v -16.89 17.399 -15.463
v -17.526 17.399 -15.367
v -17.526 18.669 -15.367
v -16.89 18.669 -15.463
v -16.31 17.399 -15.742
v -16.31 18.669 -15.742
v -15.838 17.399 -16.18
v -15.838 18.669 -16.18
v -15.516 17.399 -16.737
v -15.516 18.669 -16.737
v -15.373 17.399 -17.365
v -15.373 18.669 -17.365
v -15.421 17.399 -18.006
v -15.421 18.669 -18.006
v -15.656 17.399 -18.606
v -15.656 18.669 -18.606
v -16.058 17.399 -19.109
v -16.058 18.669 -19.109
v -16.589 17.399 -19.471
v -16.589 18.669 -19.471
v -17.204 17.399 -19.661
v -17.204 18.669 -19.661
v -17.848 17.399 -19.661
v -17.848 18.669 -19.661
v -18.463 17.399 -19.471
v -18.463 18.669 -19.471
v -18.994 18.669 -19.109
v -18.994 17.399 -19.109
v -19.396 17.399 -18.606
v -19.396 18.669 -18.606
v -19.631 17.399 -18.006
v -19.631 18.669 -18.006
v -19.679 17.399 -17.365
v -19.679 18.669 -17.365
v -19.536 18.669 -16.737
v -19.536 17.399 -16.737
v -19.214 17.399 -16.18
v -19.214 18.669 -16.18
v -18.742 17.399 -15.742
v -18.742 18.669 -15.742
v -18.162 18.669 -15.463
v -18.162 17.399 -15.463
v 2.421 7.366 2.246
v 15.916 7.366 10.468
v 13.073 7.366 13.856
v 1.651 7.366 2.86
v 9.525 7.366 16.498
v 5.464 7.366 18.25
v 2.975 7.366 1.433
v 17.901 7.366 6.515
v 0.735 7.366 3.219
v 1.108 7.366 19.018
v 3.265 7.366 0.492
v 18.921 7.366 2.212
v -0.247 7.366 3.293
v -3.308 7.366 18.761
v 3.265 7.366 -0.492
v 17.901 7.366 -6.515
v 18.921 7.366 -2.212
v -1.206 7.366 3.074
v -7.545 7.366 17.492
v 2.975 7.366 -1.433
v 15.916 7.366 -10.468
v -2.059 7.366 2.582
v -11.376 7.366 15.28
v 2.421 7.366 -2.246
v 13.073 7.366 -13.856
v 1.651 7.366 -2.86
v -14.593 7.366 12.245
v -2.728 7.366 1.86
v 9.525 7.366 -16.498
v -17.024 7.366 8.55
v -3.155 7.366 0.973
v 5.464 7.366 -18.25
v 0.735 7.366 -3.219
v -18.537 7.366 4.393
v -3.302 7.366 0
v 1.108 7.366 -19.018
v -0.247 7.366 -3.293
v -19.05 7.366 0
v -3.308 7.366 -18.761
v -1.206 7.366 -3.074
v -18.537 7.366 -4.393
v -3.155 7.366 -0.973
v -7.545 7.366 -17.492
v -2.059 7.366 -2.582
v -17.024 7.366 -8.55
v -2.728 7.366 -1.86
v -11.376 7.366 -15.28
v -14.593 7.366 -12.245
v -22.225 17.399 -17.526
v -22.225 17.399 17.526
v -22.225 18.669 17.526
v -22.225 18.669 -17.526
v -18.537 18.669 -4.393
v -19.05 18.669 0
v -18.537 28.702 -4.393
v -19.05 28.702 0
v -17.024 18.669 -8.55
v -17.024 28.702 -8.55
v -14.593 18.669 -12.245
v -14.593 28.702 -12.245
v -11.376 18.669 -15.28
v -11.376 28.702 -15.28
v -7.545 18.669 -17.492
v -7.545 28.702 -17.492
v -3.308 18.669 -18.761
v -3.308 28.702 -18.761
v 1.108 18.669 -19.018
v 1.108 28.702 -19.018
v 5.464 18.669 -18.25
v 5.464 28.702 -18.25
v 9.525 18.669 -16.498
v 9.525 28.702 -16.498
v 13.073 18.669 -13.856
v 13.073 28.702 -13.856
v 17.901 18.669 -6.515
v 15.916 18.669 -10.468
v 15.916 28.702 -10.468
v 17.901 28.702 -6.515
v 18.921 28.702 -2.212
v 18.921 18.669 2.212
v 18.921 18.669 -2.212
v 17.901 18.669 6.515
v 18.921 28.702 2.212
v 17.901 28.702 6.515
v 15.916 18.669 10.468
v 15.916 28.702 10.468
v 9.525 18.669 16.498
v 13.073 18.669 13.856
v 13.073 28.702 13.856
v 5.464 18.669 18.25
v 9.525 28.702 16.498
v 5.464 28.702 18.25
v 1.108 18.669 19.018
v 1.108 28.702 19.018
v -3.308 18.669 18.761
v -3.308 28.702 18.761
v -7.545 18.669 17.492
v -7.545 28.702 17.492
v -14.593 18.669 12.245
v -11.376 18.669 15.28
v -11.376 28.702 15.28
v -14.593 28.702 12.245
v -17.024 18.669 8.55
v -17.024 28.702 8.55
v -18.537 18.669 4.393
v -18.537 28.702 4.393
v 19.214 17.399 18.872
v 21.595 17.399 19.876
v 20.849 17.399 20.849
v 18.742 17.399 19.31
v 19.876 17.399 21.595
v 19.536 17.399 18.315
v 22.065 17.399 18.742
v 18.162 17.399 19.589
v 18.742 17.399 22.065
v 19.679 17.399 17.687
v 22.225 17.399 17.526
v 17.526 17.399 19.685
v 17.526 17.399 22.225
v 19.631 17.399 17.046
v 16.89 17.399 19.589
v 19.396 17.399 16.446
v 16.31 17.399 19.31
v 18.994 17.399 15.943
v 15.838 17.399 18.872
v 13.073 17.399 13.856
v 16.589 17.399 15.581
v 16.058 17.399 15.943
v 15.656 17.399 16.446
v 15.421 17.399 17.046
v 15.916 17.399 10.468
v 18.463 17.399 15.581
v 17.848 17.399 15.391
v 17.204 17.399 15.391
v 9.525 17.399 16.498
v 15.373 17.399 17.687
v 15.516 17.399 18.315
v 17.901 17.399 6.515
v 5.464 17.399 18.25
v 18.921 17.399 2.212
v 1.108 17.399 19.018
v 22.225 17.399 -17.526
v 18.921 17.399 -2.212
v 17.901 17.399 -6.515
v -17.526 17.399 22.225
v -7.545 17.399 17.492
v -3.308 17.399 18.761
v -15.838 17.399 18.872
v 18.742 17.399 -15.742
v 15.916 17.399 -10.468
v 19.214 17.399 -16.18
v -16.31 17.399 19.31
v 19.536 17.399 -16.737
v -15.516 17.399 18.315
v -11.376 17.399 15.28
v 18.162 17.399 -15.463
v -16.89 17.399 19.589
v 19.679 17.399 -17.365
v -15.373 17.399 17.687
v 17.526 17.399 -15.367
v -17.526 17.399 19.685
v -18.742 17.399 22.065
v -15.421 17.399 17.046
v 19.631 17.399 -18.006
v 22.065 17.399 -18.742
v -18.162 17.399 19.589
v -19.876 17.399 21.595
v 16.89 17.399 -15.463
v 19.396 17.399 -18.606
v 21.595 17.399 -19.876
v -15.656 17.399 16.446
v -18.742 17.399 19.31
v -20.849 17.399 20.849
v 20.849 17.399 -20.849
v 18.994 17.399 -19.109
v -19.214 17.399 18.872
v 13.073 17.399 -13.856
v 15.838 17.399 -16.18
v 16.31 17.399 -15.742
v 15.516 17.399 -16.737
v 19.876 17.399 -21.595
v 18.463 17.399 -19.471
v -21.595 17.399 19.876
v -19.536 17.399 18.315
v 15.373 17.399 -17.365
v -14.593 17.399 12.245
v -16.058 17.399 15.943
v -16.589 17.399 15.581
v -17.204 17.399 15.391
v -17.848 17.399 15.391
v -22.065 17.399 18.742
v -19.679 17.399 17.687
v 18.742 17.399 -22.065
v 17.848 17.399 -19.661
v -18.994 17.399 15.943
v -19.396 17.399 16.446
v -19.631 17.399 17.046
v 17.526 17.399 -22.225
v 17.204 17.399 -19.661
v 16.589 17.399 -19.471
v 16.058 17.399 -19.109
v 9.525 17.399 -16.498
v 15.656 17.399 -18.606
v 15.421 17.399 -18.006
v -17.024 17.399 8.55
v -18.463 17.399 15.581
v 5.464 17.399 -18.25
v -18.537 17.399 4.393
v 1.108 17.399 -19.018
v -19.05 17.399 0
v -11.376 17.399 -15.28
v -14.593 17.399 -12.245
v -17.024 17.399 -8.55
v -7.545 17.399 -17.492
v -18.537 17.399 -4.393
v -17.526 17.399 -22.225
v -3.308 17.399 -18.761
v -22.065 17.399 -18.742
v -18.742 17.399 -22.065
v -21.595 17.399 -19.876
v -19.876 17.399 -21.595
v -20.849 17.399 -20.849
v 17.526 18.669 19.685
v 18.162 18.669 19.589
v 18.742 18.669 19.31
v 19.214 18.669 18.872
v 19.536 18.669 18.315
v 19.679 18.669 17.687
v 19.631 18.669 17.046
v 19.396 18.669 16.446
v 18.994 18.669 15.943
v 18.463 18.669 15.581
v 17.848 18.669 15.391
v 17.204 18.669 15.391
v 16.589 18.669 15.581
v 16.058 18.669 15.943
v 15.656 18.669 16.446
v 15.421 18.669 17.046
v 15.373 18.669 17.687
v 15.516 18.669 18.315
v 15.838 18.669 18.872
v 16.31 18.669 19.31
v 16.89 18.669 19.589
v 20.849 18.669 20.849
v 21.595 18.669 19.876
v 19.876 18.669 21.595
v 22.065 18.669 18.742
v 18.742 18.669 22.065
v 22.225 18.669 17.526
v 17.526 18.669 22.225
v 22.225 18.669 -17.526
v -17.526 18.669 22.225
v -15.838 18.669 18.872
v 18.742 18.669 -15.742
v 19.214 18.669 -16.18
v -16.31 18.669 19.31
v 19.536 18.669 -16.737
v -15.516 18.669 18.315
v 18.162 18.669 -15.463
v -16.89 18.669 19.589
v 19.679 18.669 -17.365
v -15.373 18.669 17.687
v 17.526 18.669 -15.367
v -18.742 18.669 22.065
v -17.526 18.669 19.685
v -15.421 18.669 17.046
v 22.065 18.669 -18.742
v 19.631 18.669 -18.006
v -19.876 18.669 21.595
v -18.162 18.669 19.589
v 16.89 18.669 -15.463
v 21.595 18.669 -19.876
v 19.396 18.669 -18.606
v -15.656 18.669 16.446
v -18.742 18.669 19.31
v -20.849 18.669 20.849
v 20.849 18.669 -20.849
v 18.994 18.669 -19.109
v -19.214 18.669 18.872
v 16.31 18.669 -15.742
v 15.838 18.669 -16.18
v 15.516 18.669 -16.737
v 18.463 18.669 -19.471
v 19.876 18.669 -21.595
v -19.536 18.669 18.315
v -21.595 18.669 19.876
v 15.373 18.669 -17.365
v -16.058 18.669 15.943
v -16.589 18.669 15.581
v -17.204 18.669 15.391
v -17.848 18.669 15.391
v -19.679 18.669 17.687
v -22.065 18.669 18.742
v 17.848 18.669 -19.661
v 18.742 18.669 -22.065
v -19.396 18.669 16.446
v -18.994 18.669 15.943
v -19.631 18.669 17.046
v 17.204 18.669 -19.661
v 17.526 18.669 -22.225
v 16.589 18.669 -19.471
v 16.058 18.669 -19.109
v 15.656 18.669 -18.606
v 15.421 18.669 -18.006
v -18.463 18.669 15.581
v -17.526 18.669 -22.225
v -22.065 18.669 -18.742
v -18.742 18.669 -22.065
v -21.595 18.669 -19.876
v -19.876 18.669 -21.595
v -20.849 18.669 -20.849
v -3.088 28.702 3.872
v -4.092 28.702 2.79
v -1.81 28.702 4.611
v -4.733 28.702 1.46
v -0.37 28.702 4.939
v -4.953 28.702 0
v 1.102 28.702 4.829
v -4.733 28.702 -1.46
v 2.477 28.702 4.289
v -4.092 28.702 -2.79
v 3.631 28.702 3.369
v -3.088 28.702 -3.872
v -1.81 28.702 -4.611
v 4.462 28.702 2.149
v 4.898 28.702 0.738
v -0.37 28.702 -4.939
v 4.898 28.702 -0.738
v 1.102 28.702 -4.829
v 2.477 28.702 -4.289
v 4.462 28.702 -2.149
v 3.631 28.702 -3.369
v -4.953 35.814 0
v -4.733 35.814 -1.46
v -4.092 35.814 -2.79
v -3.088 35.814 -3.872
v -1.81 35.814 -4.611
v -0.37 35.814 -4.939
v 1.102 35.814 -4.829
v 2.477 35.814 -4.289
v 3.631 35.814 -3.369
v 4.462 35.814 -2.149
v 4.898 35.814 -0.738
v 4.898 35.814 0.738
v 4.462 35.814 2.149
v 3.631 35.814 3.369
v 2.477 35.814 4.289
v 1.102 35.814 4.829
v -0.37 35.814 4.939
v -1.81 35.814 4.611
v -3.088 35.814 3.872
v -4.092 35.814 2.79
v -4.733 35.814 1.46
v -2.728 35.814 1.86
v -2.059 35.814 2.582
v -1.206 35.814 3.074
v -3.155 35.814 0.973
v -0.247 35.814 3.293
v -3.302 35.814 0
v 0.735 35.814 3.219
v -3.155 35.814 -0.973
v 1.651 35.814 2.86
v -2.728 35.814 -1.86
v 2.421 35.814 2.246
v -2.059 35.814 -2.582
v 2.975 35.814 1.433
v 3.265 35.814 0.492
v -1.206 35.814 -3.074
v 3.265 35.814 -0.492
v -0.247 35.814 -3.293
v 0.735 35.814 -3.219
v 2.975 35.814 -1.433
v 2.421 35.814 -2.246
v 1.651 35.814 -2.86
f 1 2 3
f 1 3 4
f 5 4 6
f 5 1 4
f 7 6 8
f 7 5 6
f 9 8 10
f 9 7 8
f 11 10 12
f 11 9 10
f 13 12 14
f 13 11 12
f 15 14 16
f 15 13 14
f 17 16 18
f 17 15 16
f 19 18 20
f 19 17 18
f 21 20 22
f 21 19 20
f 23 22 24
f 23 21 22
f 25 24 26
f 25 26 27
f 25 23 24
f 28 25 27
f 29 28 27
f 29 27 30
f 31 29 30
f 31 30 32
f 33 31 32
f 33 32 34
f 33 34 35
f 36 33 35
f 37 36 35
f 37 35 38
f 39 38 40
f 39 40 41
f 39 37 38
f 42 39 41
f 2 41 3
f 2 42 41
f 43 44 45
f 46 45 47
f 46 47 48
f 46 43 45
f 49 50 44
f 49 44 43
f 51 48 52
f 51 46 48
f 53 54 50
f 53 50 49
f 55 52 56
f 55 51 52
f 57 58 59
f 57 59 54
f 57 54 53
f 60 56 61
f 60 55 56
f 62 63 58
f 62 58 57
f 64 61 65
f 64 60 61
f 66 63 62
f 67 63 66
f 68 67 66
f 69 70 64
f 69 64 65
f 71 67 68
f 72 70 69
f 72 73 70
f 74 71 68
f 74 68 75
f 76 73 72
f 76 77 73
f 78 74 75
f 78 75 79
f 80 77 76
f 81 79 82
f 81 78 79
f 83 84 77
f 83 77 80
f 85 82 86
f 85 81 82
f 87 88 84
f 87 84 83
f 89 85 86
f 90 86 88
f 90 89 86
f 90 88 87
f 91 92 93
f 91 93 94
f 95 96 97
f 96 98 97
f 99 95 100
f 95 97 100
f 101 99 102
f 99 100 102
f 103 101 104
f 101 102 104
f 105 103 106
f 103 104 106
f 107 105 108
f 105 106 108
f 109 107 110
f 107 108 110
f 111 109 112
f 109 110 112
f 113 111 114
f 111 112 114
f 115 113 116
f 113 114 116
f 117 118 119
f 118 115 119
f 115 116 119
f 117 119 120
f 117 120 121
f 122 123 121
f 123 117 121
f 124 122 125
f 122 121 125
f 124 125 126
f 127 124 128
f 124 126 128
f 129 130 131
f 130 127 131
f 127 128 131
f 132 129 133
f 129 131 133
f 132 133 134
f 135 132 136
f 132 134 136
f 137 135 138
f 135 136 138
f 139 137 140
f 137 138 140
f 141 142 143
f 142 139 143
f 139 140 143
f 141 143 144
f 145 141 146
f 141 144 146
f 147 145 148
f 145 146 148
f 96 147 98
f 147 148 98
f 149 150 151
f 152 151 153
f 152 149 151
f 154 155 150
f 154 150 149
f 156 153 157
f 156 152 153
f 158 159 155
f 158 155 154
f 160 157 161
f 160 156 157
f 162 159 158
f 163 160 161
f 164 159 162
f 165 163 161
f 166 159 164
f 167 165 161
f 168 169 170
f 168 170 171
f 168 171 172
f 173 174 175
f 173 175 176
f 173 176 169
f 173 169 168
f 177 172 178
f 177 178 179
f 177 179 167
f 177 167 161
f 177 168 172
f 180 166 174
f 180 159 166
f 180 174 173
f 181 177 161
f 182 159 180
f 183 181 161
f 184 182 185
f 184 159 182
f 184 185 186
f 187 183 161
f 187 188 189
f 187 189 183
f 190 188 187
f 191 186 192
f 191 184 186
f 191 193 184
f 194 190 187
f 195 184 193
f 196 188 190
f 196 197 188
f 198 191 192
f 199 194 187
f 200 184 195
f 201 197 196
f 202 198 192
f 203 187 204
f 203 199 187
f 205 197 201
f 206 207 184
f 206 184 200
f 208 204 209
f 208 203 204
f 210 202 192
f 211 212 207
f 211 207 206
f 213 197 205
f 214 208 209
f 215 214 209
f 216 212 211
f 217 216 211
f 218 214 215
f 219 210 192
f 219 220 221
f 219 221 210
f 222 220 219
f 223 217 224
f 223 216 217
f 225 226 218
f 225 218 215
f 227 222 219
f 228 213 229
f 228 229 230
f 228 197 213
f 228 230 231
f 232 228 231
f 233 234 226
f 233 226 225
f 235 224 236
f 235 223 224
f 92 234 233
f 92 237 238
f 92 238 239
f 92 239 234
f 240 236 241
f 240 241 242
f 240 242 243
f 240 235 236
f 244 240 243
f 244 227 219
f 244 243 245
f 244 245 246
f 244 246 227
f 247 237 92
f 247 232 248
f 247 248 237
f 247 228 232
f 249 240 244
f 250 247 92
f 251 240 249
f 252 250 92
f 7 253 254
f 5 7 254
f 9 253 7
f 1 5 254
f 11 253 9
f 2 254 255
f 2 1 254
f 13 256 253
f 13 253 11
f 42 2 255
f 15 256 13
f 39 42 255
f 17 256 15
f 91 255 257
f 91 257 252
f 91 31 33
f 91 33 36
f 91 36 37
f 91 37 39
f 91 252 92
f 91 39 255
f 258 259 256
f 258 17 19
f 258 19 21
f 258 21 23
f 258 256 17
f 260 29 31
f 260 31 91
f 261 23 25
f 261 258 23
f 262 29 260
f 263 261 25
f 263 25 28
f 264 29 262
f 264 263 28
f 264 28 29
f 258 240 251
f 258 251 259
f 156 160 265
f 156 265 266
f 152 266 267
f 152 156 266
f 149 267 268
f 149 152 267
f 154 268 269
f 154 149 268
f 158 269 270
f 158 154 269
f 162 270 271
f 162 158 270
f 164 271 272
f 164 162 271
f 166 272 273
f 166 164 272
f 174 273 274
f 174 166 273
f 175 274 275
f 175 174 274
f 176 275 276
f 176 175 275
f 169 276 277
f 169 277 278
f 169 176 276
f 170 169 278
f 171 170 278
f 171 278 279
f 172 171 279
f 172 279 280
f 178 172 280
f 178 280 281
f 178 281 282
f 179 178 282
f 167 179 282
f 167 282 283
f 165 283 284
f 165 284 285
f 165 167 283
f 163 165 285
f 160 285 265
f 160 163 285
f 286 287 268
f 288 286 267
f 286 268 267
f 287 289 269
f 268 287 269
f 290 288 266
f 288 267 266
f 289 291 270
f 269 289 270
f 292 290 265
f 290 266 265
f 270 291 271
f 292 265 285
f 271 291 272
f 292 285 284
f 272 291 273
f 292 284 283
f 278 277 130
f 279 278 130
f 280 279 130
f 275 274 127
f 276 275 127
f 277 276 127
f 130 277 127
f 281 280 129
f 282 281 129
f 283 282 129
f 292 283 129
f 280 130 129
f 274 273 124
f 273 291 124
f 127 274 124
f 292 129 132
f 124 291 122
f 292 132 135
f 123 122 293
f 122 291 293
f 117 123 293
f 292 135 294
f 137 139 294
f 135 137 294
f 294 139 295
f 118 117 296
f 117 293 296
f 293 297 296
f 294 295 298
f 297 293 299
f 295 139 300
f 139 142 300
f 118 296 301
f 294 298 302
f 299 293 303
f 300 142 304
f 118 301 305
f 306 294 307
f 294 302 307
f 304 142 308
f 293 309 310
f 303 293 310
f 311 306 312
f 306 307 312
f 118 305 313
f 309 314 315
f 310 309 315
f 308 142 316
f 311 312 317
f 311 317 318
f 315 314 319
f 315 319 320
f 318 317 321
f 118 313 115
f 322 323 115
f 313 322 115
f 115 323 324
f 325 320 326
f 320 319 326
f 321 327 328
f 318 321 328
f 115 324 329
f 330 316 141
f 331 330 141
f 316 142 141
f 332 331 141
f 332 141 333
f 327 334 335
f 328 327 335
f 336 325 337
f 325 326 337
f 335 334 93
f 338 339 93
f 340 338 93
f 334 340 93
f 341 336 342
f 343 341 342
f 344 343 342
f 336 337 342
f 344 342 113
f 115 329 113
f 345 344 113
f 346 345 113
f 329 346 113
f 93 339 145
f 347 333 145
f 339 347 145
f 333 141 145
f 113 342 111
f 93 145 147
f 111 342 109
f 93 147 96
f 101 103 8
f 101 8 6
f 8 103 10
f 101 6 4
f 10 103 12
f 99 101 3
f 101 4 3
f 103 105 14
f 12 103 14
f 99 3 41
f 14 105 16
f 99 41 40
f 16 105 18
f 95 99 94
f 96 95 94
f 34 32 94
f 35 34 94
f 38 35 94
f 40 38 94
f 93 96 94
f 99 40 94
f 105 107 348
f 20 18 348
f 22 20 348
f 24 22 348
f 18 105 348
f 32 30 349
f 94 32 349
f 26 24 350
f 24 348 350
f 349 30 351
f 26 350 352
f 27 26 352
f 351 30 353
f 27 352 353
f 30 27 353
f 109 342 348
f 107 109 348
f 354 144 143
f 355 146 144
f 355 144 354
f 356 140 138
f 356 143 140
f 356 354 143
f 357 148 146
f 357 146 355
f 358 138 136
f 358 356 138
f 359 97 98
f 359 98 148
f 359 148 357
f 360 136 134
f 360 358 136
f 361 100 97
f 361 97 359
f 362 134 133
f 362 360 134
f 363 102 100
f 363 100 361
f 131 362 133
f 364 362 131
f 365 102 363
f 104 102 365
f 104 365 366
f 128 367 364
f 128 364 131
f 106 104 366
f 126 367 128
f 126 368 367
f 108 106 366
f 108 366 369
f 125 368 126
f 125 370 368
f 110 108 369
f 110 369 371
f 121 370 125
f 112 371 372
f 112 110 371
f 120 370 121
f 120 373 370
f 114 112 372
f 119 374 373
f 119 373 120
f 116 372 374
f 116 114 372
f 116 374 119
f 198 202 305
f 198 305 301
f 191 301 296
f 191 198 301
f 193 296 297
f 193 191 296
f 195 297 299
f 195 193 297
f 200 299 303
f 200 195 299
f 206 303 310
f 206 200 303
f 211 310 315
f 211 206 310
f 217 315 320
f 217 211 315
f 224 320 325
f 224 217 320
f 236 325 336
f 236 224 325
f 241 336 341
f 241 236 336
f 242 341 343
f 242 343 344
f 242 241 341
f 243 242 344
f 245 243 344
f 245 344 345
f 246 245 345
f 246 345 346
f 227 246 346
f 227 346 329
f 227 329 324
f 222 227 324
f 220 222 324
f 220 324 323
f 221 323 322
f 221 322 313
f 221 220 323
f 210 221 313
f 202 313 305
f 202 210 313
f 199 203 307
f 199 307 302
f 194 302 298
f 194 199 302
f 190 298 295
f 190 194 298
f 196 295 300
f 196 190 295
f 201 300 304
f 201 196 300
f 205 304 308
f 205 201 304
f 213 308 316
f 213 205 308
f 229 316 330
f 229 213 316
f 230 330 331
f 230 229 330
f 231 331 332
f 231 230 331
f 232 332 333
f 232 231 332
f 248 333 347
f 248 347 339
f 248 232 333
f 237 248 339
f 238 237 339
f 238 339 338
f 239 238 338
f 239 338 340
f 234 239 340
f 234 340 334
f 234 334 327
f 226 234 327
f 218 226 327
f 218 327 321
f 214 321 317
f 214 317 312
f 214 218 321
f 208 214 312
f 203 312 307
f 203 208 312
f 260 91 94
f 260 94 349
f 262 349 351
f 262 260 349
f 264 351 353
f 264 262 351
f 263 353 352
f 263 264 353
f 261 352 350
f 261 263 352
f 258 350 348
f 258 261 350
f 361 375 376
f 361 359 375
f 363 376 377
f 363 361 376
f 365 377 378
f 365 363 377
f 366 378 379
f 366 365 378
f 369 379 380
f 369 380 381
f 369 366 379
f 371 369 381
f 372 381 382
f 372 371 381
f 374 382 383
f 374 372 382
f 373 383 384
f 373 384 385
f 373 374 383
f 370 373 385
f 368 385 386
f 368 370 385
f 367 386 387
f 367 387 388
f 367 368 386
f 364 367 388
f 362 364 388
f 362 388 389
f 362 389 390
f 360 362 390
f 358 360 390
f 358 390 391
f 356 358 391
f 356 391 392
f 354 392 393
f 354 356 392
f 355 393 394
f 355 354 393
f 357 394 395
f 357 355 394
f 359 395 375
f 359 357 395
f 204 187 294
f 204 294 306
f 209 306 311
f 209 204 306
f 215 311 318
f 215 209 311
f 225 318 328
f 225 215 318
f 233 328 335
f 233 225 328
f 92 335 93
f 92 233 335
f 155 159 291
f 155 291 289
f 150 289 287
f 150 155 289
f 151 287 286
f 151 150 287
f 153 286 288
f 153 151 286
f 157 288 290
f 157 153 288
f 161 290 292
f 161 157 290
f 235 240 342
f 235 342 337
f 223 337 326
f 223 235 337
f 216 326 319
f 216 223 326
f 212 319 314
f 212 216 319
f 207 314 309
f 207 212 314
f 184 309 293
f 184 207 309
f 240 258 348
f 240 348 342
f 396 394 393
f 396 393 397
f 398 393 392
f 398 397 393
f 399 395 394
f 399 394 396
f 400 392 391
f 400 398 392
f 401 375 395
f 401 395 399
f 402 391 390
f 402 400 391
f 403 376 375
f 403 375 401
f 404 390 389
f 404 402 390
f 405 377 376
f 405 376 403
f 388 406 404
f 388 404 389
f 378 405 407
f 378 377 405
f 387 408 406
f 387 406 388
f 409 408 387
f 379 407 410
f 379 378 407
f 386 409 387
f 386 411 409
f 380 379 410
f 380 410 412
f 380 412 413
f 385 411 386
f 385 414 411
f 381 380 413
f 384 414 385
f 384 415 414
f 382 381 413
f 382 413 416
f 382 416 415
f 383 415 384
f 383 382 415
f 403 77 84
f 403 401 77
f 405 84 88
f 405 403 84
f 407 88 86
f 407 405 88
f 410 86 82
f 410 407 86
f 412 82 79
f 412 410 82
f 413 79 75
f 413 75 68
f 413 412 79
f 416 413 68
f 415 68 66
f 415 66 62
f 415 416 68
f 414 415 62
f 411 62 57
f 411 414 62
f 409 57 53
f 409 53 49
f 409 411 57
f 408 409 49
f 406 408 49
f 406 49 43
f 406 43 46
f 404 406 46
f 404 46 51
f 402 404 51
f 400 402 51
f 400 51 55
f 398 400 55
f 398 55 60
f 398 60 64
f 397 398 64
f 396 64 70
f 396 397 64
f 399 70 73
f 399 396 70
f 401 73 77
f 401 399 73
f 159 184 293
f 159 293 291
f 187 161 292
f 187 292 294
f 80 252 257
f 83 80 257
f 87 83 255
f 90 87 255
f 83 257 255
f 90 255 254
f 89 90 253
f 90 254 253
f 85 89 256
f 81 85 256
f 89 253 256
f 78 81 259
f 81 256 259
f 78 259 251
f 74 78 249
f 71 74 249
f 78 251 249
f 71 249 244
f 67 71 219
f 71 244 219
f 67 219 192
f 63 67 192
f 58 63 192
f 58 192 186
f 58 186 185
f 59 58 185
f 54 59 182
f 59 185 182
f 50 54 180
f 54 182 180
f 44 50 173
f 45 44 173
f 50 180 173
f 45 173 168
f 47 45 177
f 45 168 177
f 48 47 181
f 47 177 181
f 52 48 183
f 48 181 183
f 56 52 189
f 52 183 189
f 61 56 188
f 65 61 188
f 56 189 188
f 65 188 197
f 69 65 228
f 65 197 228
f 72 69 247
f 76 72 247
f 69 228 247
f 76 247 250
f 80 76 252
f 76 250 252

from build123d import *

# Parameters (mm, degrees)
SKETCH3_R           = 19.05
SKETCH3_R_2         = 2.159
BOSS_EXTRUDE1_DEPTH = 1.27


with BuildPart() as part:
    # Sketch2 → Revolve1 (revolve)
    with BuildSketch(Plane.XY, mode=Mode.PRIVATE) as revolve1_sk:
        Polygon((3.302, 35.814), (4.953, 35.814), (4.953, 28.702), (19.05, 28.702), (19.05, 18.669), (19.05, 17.399), (19.05, 7.366), (3.302, 7.366), align=None)
    revolve(revolve1_sk.sketch.rotate(Axis((0, 35.814, 0), (0, -1, 0)), 180), axis=Axis((0, 35.814, 0), (0, -1, 0)))

    # Sketch3 → Boss-Extrude1 (add)
    with BuildSketch(Plane(origin=(0, 17.399, 0), x_dir=(1, 0, 0), z_dir=(0, 1, 0))):
        with BuildLine():
            Line((-17.526, 22.225), (17.526, 22.225))
            ThreePointArc((17.526, 22.225), (20.848694765, 20.848694765), (22.225, 17.526))
            Line((22.225, 17.526), (22.225, -17.526))
            ThreePointArc((22.225, -17.526), (20.848694765, -20.848694765), (17.526, -22.225))
            Line((17.526, -22.225), (-17.526, -22.225))
            ThreePointArc((-17.526, -22.225), (-20.848694765, -20.848694765), (-22.225, -17.526))
            Line((-22.225, -17.526), (-22.225, 17.526))
            ThreePointArc((-22.225, 17.526), (-20.848694765, 20.848694765), (-17.526, 22.225))
        make_face()
        with Locations(Location((0, 0, 0), (0, 0, 180))):
            Circle(SKETCH3_R, mode=Mode.SUBTRACT)
        with Locations(Location((-17.526, -17.526, 0), (0, 0, 270))):
            Circle(SKETCH3_R_2, mode=Mode.SUBTRACT)
        with Locations(Location((17.526, -17.526, 0), (0, 0, 270))):
            Circle(SKETCH3_R_2, mode=Mode.SUBTRACT)
        with Locations(Location((-17.526, 17.526, 0), (0, 0, 270))):
            Circle(SKETCH3_R_2, mode=Mode.SUBTRACT)
        with Locations(Location((17.526, 17.526, 0), (0, 0, 270))):
            Circle(SKETCH3_R_2, mode=Mode.SUBTRACT)
    extrude(amount=BOSS_EXTRUDE1_DEPTH)


solid = part.part
